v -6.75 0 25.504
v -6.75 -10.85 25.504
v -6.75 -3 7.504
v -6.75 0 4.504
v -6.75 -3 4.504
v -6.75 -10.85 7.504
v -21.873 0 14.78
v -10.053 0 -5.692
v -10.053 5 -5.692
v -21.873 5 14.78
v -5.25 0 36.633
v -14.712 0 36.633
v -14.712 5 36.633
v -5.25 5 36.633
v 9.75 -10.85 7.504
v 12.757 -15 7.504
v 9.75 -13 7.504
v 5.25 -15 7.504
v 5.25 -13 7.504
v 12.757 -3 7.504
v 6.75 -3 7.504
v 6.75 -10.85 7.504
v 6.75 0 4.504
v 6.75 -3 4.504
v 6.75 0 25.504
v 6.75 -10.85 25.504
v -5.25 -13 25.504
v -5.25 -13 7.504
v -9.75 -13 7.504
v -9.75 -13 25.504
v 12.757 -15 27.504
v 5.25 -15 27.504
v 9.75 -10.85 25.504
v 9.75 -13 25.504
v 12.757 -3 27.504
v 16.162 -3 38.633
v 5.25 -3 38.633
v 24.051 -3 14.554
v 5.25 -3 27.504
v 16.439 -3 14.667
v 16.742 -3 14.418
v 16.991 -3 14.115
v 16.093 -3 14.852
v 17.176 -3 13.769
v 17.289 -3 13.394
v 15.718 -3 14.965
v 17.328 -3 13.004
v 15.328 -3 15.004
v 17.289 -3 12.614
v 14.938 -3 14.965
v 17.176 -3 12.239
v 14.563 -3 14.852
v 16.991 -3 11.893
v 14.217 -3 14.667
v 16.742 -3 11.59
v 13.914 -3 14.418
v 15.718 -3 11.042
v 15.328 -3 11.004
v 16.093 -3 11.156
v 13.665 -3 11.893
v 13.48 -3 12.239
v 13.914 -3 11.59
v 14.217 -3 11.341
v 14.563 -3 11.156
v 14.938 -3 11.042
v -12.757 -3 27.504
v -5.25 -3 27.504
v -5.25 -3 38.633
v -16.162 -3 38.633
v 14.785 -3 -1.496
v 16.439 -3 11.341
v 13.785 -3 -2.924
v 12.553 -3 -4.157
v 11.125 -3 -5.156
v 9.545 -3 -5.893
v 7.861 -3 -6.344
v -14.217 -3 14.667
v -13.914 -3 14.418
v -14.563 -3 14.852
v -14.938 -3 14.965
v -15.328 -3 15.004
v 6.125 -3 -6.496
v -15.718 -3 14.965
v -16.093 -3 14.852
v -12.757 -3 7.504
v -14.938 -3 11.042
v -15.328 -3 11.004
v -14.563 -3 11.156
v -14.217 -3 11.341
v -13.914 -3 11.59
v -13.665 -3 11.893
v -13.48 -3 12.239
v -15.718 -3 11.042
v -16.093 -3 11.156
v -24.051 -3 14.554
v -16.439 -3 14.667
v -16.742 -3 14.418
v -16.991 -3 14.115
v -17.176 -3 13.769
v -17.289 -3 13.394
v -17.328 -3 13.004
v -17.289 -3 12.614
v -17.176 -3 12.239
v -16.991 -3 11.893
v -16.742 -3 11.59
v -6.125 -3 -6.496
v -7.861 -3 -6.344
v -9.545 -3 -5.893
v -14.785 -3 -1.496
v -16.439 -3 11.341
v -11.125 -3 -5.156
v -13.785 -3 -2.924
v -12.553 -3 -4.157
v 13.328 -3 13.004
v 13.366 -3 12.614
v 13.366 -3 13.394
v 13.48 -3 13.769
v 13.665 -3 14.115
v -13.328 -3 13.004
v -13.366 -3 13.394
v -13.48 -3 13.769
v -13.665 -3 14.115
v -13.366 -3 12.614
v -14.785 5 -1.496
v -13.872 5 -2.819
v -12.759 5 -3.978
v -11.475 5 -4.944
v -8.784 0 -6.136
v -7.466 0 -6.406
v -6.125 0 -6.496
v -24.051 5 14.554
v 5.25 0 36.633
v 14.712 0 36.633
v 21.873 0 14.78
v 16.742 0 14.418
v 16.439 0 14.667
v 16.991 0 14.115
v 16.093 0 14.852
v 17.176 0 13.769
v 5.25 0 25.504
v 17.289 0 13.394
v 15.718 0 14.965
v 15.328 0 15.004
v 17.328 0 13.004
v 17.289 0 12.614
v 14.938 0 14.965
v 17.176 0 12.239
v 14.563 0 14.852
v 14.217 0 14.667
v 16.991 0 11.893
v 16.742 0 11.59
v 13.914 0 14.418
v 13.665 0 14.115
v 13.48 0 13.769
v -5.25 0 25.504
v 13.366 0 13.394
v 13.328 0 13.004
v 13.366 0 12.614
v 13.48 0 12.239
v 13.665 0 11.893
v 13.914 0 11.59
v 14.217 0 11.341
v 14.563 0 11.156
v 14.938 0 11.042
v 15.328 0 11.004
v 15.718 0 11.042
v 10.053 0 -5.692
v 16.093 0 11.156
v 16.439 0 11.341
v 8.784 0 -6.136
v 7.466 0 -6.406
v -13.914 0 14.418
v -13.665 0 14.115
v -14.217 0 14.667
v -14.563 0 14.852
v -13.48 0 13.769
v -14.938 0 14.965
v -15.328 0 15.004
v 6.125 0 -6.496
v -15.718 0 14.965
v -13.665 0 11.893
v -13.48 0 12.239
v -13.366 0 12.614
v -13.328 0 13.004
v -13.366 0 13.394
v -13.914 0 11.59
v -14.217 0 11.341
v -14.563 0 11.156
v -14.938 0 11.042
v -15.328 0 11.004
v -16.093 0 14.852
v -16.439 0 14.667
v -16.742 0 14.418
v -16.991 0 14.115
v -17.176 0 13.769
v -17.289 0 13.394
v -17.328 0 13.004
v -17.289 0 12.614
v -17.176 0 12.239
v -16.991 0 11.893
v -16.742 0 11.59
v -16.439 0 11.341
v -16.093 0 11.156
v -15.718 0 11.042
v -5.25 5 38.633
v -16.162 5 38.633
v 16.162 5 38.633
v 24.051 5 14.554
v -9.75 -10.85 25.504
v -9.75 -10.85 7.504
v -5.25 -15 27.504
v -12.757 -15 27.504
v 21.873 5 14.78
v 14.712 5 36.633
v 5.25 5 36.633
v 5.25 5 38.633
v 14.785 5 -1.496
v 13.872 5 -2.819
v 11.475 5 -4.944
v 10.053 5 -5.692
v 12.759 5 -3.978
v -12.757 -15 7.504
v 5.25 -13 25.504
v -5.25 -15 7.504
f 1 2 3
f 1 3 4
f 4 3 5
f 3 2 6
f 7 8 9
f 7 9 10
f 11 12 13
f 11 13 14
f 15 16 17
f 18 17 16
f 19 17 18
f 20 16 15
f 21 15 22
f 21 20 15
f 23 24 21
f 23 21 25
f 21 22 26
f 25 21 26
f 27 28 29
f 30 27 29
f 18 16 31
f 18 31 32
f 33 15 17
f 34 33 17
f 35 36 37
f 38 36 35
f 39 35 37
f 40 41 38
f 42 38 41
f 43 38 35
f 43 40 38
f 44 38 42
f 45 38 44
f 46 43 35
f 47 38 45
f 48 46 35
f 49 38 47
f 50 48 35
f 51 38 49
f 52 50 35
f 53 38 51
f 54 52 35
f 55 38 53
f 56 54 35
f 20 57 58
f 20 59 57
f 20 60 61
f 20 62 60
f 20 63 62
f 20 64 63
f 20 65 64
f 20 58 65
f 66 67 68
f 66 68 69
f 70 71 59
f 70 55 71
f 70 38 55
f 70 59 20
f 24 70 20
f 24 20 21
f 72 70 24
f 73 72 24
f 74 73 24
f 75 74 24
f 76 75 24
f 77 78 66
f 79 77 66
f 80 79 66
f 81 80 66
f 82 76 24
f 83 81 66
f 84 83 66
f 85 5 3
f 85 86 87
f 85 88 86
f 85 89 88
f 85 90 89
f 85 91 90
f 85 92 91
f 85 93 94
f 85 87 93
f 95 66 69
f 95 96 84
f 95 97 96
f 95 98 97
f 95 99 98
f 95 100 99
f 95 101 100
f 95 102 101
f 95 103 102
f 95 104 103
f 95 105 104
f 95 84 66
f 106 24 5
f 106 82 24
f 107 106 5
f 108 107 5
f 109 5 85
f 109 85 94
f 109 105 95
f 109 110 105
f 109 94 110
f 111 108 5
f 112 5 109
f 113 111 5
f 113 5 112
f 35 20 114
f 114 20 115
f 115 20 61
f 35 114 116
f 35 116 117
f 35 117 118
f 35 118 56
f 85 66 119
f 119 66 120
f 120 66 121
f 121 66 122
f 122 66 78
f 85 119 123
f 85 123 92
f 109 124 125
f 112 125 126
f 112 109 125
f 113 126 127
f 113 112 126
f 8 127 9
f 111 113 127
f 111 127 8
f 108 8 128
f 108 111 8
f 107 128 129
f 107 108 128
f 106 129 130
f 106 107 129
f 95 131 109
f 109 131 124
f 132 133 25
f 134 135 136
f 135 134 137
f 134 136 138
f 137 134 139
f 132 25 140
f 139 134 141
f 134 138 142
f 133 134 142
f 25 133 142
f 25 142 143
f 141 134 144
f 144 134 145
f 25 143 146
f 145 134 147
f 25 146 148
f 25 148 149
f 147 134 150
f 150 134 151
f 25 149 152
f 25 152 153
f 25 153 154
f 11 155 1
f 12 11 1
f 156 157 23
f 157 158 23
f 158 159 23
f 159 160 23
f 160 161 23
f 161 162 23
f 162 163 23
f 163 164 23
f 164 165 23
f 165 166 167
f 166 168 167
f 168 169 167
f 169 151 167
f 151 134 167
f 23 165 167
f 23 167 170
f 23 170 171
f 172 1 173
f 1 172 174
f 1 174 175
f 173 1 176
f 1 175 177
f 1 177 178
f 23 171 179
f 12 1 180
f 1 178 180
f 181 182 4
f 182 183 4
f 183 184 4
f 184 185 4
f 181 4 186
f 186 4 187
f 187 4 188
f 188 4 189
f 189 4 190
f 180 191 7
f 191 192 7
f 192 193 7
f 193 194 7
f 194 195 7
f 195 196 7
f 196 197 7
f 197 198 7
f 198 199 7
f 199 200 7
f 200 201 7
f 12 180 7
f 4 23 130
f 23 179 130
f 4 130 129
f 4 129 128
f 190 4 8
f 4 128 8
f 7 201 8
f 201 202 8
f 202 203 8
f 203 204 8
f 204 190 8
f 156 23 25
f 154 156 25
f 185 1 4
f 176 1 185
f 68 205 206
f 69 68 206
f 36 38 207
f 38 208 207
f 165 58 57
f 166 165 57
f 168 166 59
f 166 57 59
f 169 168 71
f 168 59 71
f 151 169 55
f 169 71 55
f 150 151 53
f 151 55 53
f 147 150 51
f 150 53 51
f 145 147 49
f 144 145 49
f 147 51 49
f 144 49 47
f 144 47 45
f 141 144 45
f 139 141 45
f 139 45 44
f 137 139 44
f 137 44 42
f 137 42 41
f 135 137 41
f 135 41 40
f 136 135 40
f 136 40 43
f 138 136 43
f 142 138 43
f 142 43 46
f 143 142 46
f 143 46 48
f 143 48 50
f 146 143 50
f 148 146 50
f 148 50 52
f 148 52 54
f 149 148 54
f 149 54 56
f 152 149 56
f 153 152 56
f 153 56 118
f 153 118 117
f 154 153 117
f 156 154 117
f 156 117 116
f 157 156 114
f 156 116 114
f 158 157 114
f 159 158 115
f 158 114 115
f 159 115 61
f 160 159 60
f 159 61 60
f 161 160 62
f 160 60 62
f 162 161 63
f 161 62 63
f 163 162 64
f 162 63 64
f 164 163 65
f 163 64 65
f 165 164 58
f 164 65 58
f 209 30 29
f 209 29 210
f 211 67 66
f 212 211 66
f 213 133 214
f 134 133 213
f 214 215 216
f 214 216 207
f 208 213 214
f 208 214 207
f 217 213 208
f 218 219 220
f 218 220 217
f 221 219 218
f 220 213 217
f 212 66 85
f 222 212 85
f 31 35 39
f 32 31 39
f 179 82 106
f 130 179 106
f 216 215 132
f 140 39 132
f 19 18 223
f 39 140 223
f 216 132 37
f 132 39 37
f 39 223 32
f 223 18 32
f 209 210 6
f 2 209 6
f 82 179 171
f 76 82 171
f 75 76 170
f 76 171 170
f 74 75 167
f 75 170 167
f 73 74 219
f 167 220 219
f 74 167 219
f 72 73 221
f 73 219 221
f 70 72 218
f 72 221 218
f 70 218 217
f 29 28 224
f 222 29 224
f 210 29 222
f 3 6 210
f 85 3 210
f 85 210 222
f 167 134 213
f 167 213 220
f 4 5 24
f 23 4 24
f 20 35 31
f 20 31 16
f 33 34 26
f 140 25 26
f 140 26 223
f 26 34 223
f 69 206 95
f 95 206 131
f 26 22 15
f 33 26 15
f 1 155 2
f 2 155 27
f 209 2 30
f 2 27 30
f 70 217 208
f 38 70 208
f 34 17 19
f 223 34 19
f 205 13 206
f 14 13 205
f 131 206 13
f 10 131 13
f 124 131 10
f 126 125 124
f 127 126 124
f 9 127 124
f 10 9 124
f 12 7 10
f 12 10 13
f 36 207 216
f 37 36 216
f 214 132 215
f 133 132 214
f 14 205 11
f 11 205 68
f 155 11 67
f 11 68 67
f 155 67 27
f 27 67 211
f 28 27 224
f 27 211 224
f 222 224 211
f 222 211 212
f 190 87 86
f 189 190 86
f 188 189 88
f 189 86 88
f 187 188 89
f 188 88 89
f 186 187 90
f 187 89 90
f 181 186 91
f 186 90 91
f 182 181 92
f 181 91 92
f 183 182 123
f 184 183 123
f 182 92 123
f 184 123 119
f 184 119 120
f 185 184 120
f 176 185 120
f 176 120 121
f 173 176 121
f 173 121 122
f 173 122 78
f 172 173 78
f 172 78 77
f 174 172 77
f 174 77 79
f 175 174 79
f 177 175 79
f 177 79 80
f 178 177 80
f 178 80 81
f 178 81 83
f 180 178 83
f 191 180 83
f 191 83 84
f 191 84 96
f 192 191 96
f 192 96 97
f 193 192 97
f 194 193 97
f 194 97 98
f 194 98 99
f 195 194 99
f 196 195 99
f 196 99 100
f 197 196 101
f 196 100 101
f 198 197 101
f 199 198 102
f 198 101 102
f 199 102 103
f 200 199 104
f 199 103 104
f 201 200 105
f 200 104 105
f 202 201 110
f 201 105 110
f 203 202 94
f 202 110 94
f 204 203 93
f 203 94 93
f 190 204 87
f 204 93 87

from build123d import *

# Parameters (mm, degrees)
BOSS_EXTRUDE1_DEPTH = 5
BOSS_EXTRUDE2_DEPTH = 3
SKETCH3_W           = 7.507408842
SKETCH3_H           = 20
BOSS_EXTRUDE3_DEPTH = 12
CUT_EXTRUDE2_DEPTH  = 18
SKETCH6_R           = 2
CUT_EXTRUDE3_DEPTH  = 48.063378728
SKETCH7_W           = 24.049396926
SKETCH7_H           = 4
CUT_EXTRUDE4_DEPTH  = 10
FILLET1_R           = 10


with BuildPart() as part:
    # Sketch1 → Boss-Extrude1 (new body)
    with BuildSketch(Plane(origin=(0, 0, 0), x_dir=(1, 0, 0), z_dir=(0, 1, 0))):
        Polygon((-10.454849344, 8.996116817), (-24.051323202, -14.553666709), (-16.16163723, -38.632828909), (16.16163723, -38.632828909), (24.051323202, -14.553666709), (10.454849344, 8.996116817), align=None)
        Polygon((9.300148806, 6.996116817), (-9.300148806, 6.996116817), (-21.872561183, -14.779940194), (-14.712327446, -36.632828909), (14.712327446, -36.632828909), (21.872561183, -14.779940194), align=None, mode=Mode.SUBTRACT)
    extrude(amount=BOSS_EXTRUDE1_DEPTH)

    # Sketch2 → Boss-Extrude2 (add)
    with BuildSketch(Plane(origin=(0, 0, 0), x_dir=(-1, 0, 0), z_dir=(0, -1, 0))):
        Polygon((24.051323202, -14.553666709), (10.454849344, 8.996116817), (-10.454849344, 8.996116817), (-24.051323202, -14.553666709), (-16.16163723, -38.632828909), (16.16163723, -38.632828909), align=None)
    extrude(amount=BOSS_EXTRUDE2_DEPTH)

    # Sketch3 → Boss-Extrude3 (add)
    with BuildSketch(Plane(origin=(0, -3, 0), x_dir=(-1, 0, 0), z_dir=(0, -1, 0))):
        with Locations((9.003704421, -17.503883183)):
            Rectangle(SKETCH3_W, SKETCH3_H)
        with Locations((-9.003704421, -17.503883183)):
            Rectangle(SKETCH3_W, SKETCH3_H)
    extrude(amount=BOSS_EXTRUDE3_DEPTH)

    # Sketch5 → Cut-Extrude2 (cut)
    with BuildSketch(Plane(origin=(0, 0, 7.503883183), x_dir=(-1, 0, 0), z_dir=(0, 0, -1))):
        Polygon((-9.75, -13), (9.75, -13), (9.75, -10.85), (6.75, -10.85), (6.75, -3), (5.25, -3), (5.25, -10.85), (-5.25, -10.85), (-5.25, -3), (-6.75, -3), (-6.75, -10.85), (-9.75, -10.85), align=None)
    extrude(amount=-CUT_EXTRUDE2_DEPTH, mode=Mode.SUBTRACT)

    # Sketch6 → Cut-Extrude3 (cut, through all)
    with BuildSketch(Plane(origin=(0, -3, 0), x_dir=(-1, 0, 0), z_dir=(0, -1, 0))):
        with Locations(Location((-15.327870678, -13.003883183, 0), (0, 0, 90))):
            Circle(SKETCH6_R)
        with Locations(Location((15.327870678, -13.003883183, 0), (0, 0, 90))):
            Circle(SKETCH6_R)
        Polygon((-5.25, -38.632828909), (5.25, -38.632828909), (5.25, -25.503883183), (6.75, -25.503883183), (6.75, -4.503883183), (-6.75, -4.503883183), (-6.75, -25.503883183), (-5.25, -25.503883183), align=None)
    extrude(amount=-CUT_EXTRUDE3_DEPTH, mode=Mode.SUBTRACT)

    # Sketch7 → Cut-Extrude4 (cut)
    with BuildSketch(Plane(origin=(0, -3, 0), x_dir=(-1, 0, 0), z_dir=(0, -1, 0))):
        with Locations((0, 8.496116817)):
            Rectangle(SKETCH7_W, SKETCH7_H)
    extrude(amount=-CUT_EXTRUDE4_DEPTH, mode=Mode.SUBTRACT)

    # Fillet1
    fillet1_edges = [part.edges().sort_by_distance(p)[0] for p in [
        (-11.898225017, 1, -6.496116817),
        (11.898225017, 1, -6.496116817),
    ]]
    fillet(fillet1_edges, radius=FILLET1_R)


solid = part.part
